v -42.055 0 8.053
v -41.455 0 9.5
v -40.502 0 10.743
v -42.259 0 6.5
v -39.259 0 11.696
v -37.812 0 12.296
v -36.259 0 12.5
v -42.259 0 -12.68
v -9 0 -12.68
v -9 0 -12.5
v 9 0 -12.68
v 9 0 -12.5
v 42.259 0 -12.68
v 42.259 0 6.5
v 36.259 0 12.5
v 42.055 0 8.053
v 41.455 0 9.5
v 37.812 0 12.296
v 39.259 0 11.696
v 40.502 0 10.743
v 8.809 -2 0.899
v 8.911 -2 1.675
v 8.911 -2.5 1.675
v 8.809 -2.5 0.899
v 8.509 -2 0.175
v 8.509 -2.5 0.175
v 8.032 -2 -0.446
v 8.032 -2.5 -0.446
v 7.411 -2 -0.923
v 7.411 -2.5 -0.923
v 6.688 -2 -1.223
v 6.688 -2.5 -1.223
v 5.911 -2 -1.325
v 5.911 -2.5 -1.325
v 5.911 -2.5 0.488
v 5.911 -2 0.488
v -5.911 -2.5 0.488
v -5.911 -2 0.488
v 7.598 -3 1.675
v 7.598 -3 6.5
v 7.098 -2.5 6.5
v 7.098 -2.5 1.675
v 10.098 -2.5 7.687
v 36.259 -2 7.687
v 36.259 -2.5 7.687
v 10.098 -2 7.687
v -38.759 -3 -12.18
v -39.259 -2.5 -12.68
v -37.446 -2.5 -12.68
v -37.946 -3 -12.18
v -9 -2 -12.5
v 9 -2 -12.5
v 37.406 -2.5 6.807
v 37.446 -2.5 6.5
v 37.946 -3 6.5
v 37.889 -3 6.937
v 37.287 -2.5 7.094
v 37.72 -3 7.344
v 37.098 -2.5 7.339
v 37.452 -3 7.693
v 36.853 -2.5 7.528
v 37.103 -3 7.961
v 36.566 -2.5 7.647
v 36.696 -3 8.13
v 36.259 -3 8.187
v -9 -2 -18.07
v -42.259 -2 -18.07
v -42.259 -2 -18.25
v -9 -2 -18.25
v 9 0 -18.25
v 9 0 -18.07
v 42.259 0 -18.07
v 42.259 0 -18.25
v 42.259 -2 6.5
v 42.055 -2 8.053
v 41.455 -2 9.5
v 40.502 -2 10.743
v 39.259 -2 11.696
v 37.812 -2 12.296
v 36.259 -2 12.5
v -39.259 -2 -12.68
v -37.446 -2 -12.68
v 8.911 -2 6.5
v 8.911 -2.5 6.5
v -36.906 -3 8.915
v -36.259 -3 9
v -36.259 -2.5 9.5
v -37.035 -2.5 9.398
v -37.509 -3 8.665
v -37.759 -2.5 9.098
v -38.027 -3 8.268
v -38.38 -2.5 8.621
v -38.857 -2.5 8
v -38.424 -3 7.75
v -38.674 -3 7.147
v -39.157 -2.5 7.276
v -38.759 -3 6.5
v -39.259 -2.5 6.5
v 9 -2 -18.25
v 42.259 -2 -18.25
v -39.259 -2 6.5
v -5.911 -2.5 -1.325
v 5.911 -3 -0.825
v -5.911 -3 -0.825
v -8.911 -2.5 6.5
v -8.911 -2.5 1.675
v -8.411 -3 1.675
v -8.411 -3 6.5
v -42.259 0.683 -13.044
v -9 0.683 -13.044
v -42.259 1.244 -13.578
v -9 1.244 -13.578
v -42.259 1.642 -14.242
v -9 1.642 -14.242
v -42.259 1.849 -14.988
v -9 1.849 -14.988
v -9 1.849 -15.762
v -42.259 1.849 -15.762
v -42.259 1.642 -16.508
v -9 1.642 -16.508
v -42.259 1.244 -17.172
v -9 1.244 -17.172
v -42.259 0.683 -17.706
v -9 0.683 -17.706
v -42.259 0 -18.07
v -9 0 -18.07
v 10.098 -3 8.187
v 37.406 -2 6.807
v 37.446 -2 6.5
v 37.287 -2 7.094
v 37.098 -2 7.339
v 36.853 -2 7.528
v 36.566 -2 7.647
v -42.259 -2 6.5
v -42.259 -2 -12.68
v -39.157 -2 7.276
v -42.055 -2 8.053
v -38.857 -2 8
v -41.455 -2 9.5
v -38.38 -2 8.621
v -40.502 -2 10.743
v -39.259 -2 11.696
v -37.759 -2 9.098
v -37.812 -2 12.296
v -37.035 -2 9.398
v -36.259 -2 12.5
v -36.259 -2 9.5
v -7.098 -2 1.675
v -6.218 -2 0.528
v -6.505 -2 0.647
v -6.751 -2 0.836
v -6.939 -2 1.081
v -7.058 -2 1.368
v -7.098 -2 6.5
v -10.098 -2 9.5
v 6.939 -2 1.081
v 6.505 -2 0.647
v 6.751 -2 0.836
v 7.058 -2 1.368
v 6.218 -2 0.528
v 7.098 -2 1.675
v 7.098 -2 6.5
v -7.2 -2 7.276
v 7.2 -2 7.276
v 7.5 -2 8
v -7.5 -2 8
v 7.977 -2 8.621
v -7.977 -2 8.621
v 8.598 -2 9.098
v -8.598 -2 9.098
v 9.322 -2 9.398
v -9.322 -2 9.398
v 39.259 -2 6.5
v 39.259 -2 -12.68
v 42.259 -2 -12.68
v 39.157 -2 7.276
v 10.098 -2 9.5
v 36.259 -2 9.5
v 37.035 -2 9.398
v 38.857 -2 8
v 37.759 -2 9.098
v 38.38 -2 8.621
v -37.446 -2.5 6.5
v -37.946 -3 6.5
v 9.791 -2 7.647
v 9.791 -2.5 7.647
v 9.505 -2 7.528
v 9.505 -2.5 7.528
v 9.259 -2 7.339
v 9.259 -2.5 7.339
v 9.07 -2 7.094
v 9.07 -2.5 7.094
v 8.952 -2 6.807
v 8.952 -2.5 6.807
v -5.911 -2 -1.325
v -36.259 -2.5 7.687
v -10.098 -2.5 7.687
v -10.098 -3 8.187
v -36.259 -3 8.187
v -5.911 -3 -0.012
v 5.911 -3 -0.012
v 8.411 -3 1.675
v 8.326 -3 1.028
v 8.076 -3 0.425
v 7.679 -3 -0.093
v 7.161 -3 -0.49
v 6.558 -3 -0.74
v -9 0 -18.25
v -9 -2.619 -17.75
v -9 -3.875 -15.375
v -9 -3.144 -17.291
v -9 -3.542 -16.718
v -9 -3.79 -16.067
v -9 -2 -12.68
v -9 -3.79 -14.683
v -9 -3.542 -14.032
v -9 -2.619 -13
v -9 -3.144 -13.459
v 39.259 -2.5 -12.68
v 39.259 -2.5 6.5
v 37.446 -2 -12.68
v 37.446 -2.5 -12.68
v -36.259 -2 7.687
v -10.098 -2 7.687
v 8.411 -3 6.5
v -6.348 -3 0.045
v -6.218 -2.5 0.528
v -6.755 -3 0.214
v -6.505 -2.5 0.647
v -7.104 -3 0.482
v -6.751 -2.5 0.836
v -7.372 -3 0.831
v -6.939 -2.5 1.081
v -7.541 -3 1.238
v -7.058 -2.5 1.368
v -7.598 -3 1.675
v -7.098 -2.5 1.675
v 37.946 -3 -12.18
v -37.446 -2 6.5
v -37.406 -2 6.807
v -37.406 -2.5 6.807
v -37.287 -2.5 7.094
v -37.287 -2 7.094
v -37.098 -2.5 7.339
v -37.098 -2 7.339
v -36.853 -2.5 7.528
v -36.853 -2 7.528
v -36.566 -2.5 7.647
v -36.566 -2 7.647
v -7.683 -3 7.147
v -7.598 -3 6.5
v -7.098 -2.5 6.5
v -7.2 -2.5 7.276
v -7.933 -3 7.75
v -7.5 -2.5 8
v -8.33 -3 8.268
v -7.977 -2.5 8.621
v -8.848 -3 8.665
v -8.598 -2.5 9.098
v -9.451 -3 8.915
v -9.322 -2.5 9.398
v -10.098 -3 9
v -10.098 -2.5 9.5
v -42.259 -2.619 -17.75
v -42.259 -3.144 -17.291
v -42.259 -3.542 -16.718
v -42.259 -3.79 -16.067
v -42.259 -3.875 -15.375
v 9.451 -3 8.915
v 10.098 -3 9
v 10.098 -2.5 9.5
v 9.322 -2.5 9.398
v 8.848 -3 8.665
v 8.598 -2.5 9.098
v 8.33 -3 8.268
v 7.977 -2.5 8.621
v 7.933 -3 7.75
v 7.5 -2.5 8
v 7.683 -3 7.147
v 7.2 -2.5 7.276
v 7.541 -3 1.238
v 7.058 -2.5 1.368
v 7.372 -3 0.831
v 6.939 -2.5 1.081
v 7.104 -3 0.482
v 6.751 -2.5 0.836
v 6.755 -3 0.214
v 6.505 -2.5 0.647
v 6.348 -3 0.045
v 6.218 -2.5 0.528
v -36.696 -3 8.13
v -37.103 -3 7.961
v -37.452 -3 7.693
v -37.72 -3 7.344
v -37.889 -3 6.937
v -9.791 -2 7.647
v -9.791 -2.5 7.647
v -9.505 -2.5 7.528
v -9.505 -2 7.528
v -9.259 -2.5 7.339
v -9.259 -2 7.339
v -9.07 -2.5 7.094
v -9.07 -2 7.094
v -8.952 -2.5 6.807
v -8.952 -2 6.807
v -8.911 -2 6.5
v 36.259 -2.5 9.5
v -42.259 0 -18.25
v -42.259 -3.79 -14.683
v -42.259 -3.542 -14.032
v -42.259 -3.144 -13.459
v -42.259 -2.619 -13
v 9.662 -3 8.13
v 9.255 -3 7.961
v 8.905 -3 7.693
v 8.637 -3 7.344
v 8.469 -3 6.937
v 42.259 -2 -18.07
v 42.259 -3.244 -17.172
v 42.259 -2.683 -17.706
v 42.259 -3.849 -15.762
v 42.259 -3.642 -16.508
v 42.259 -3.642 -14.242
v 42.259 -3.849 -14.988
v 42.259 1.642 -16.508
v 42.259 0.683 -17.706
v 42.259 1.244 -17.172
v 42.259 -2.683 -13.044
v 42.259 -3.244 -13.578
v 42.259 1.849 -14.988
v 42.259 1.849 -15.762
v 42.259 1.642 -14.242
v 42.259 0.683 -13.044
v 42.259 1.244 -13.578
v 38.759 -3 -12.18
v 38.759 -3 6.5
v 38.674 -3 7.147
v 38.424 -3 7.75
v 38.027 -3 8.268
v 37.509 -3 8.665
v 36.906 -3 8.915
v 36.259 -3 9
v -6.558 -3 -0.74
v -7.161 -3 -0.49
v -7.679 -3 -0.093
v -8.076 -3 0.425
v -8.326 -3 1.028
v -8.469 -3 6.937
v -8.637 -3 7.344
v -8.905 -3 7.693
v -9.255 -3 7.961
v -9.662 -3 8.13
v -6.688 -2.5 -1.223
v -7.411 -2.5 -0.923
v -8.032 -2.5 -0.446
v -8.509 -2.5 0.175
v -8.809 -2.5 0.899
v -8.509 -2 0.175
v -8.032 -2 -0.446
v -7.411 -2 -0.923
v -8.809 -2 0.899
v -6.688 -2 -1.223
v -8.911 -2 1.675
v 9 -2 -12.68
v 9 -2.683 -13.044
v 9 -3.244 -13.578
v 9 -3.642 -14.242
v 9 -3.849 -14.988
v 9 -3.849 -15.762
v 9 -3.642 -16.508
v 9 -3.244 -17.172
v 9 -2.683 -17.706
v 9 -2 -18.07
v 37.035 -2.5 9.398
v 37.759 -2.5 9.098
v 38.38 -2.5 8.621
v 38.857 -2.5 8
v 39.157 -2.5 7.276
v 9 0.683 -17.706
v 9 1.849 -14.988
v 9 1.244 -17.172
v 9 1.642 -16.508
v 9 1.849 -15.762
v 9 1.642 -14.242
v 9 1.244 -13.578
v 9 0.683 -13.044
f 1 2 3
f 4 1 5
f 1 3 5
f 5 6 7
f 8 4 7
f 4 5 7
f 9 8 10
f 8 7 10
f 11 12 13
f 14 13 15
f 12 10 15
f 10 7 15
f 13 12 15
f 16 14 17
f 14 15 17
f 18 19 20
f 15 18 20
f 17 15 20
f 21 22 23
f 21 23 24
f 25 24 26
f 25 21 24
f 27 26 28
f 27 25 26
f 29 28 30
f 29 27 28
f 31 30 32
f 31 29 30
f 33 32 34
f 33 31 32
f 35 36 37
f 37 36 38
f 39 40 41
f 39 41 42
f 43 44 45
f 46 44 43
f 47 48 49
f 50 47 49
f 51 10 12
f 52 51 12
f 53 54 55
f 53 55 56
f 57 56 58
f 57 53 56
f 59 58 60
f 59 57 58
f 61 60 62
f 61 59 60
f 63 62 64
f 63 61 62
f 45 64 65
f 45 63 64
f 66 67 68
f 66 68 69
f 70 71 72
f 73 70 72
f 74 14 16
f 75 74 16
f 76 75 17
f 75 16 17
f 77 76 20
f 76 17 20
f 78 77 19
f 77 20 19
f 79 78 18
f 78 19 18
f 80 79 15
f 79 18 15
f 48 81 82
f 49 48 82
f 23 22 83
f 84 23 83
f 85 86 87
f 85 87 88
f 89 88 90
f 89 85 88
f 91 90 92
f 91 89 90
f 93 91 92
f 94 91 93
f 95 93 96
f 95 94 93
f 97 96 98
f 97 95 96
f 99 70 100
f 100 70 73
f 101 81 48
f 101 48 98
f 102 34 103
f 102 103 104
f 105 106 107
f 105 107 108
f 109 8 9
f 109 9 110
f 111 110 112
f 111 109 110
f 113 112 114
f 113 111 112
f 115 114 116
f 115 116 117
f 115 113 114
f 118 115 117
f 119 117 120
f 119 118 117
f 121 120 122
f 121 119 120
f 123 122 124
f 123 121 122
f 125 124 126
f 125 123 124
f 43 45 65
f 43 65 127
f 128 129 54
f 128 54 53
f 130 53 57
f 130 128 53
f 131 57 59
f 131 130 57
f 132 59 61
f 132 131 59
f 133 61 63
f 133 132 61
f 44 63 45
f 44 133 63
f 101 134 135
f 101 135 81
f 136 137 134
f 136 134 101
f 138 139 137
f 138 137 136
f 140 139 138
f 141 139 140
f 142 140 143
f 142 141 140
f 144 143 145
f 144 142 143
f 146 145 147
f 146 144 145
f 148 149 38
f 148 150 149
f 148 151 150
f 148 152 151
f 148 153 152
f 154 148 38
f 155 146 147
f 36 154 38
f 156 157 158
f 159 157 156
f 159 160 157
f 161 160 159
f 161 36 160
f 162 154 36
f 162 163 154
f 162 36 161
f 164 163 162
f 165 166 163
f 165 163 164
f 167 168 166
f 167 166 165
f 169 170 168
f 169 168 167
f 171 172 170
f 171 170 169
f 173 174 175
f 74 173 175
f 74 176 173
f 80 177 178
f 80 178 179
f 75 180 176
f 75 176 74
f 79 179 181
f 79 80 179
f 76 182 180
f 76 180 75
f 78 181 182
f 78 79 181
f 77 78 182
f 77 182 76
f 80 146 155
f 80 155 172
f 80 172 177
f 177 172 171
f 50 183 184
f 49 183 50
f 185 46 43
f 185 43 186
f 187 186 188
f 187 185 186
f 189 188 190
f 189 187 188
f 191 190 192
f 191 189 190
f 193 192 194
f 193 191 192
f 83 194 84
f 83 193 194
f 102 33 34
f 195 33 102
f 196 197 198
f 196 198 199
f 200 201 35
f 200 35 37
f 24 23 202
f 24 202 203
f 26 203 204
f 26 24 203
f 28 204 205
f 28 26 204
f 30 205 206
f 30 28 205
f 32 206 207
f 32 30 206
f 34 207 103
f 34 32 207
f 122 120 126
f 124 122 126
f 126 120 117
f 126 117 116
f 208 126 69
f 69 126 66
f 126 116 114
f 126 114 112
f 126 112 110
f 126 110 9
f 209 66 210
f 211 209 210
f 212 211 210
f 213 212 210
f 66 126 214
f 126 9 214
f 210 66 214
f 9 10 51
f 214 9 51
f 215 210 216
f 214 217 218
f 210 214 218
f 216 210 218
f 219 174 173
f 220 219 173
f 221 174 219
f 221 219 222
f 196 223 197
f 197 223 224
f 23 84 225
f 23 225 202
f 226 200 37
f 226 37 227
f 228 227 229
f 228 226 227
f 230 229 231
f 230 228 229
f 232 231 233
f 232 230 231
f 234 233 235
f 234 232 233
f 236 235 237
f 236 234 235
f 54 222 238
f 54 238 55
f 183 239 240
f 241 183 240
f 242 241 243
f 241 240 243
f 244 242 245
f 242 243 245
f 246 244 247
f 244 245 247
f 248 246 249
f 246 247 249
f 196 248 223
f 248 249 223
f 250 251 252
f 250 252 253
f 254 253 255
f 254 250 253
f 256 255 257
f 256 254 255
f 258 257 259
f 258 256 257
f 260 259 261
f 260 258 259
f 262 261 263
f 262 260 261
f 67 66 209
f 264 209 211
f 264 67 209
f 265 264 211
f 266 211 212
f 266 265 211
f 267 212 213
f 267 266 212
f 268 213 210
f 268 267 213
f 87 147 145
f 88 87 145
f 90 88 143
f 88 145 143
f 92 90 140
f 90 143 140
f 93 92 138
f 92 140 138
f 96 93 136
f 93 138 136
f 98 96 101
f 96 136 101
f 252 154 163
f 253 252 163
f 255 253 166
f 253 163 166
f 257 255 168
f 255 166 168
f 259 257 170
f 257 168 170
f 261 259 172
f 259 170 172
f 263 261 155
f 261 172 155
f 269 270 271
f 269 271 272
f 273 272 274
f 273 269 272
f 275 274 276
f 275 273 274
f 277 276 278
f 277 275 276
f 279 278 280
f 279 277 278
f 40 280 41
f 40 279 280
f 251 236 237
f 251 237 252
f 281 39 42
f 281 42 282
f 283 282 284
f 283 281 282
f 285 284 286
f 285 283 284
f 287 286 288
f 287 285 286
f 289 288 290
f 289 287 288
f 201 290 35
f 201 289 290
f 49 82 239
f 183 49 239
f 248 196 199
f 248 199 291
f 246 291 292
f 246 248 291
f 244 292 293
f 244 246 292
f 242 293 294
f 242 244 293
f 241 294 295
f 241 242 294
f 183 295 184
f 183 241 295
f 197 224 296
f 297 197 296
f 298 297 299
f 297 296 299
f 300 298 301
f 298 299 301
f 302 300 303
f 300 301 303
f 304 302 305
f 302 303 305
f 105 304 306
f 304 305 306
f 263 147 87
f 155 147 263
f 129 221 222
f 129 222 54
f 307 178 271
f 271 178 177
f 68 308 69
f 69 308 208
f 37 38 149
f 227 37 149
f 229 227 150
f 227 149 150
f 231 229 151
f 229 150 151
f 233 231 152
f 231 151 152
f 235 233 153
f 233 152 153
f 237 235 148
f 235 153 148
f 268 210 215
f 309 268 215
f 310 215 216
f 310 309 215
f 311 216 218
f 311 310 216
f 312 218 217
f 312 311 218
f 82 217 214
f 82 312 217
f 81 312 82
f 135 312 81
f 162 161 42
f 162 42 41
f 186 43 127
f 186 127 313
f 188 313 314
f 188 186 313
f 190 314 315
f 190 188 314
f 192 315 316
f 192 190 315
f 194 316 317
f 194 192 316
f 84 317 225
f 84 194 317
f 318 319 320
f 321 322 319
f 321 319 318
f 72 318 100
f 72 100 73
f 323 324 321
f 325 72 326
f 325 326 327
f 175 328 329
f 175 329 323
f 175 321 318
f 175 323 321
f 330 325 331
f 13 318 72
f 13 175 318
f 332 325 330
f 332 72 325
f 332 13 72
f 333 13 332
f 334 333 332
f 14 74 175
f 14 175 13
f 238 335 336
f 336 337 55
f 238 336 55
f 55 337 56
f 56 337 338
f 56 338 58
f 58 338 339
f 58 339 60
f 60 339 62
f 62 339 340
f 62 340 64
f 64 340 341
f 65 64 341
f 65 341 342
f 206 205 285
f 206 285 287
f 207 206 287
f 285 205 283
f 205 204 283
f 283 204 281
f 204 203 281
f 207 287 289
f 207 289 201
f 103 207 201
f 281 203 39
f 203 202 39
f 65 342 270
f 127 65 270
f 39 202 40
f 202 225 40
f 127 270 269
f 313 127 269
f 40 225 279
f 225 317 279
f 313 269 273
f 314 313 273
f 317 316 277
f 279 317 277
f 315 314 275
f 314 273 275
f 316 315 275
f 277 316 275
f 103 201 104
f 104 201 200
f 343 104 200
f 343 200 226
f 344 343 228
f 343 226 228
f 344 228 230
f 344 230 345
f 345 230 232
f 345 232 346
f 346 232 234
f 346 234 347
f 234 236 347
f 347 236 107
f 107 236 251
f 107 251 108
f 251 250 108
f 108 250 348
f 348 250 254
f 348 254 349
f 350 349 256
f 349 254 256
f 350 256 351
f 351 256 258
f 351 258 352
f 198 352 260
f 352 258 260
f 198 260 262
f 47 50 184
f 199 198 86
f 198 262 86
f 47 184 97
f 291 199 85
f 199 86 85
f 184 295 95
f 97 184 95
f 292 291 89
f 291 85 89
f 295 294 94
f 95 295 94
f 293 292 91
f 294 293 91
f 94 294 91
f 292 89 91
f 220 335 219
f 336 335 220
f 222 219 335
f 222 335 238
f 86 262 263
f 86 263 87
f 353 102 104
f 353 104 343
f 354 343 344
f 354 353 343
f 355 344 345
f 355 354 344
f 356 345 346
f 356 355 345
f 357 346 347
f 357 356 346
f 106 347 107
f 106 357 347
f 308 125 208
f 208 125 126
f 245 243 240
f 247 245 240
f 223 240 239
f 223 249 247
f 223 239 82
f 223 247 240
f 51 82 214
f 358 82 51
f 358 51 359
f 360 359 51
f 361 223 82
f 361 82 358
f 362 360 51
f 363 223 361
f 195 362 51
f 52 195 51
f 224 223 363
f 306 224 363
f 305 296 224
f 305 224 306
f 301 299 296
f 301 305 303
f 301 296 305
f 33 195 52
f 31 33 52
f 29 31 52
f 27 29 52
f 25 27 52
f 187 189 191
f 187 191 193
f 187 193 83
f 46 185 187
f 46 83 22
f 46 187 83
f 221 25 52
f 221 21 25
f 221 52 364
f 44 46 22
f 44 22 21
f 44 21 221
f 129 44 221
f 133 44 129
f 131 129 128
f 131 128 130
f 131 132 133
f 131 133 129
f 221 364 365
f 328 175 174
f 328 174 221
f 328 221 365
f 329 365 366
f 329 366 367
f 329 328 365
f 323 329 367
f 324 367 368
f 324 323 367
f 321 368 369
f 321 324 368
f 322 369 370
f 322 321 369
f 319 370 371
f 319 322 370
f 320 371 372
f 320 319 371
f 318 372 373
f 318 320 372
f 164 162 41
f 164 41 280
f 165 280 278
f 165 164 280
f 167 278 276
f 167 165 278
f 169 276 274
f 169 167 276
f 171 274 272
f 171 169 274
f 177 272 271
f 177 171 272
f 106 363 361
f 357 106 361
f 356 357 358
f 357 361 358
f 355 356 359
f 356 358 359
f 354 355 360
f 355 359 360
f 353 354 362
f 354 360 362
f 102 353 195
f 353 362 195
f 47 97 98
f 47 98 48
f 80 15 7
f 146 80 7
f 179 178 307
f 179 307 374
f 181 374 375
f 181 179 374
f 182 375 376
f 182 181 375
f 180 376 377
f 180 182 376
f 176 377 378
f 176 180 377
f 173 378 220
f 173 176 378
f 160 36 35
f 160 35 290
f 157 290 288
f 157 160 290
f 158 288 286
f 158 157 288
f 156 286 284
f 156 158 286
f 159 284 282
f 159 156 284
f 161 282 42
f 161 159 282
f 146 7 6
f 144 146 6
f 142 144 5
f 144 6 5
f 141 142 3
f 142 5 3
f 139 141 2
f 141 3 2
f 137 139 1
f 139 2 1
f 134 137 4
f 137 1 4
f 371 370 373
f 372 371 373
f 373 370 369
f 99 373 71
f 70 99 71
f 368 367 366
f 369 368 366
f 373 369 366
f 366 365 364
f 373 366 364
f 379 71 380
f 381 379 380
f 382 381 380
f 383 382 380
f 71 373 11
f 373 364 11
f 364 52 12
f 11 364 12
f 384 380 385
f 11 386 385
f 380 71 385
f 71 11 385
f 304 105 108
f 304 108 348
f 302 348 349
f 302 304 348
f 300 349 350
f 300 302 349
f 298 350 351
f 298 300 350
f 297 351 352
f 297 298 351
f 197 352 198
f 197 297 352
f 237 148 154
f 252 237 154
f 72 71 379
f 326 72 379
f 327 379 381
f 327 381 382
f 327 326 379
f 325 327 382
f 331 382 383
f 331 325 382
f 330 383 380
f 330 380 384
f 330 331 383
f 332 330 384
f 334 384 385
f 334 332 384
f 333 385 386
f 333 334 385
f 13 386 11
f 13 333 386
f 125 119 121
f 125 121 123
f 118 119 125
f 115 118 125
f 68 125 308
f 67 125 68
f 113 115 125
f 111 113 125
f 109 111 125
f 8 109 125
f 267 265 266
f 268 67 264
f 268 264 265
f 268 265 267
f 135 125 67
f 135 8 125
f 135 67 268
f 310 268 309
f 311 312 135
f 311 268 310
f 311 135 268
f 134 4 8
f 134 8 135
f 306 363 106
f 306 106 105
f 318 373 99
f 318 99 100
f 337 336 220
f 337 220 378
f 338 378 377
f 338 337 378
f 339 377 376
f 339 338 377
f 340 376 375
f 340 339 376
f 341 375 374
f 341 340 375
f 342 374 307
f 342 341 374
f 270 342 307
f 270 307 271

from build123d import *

# Parameters (mm, degrees)
F0_W     = 33.259
F0_H     = 5.75
F1_DEPTH = 2
F3_DEPTH = 33.259
F6_DEPTH = 33.259
F4_W     = 1.8128321722
F4_H     = 19.1795176684
F4_W_2   = 26.160747505
F4_H_2   = 1.8128321722
F4_H_3   = 4.8250346239
F4_W_3   = 5.911082495
F4_H_4   = 1.81283
F7_DEPTH = 1
F8_SIZE  = 0.5


# Not quite as in the source:
# - ends of sketch curves that miss each other by under 0.0002 mm in the source are joined
# - a pattern or mirror of a feature is missing from the dataset's text; its kind, count and spacing are read off the source's solid


with BuildPart() as f1:
    # F0 (on Front) → F1 (new body)
    with BuildSketch(Plane.XZ):
        with BuildLine():
            Line((36.259, 12.5), (-36.259, 12.5))
            ThreePointArc((-36.259, 12.5), (-40.5016406871, 10.7426406871), (-42.259, 6.5))
            Line((-42.259, 6.5), (-42.259, -12.5))
            Line((-42.259, -12.5), (-9, -12.5))
            Line((-9, -12.5), (-3.6677482234, -11.0712274426))
            Line((-3.6677482234, -11.0712274426), (3.6677482234, -11.0712274426))
            Line((3.6677482234, -11.0712274426), (9, -12.5))
            Line((9, -12.5), (42.259, -12.5))
            Line((42.259, -12.5), (42.259, 6.5))
            ThreePointArc((42.259, 6.5), (40.5016406871, 10.7426406871), (36.259, 12.5))
        make_face()
        with Locations((-25.6295, -15.375)):
            Rectangle(F0_W, F0_H)
        with Locations((25.6295, -15.375)):
            Rectangle(F0_W, F0_H)
        Polygon((-3.6677482234, -11.0712274426), (-9, -12.5), (9, -12.5), (3.6677482234, -11.0712274426), align=None)
    extrude(amount=F1_DEPTH)

    # F2 (on face) → F3 (join, through all)
    with BuildSketch(Plane(origin=(-42.259, 0, 0), x_dir=(0, -1, 0), z_dir=(-1, 0, 0))):
        with BuildLine():
            ThreePointArc((3.875, -15.375), (3.3601509486, -13.7332593079), (2, -12.6795176684))
            Line((2, -12.6795176684), (2, -18.0704823316))
            ThreePointArc((2, -18.0704823316), (3.3601509486, -17.0167406921), (3.875, -15.375))
        make_face()
        with BuildLine():
            Line((2, -18.0704823316), (2, -12.6795176684))
            ThreePointArc((2, -12.6795176684), (-1.875, -15.375), (2, -18.0704823316))
        make_face()
    extrude(amount=-F3_DEPTH)

    # F5 (on face) → F6 (join, through all)
    with BuildSketch(Plane.YZ.offset(42.259)):
        with BuildLine():
            ThreePointArc((0, -18.0704823316), (1.875, -15.375), (0, -12.6795176684))
            Line((0, -12.6795176684), (0, -12.5))
            Line((0, -12.5), (-2, -12.5))
            Line((-2, -12.5), (-2, -12.6795176684))
            ThreePointArc((-2, -12.6795176684), (-3.875, -15.375), (-2, -18.0704823316))
            Line((-2, -18.0704823316), (-2, -18.25))
            Line((-2, -18.25), (0, -18.25))
            Line((0, -18.25), (0, -18.0704823316))
        make_face()
    extrude(amount=-F6_DEPTH)

    # F4 (on face) → F7 (join)
    with BuildSketch(Plane.XZ.offset(2)):
        with Locations((-38.3525839139, -3.0897588342)):
            Rectangle(F4_W, F4_H)
        with BuildLine():
            ThreePointArc((-36.259, 9.5), (-38.3803203436, 8.6213203436), (-39.259, 6.5))
            Line((-39.259, 6.5), (-37.4461678278, 6.5))
            ThreePointArc((-37.4461678278, 6.5), (-37.0984544214, 7.3394544214), (-36.259, 7.6871678278))
            Line((-36.259, 7.6871678278), (-36.259, 9.5))
        make_face()
        with Locations((-23.1786262475, 8.5935839139)):
            Rectangle(F4_W_2, F4_H_2)
        with BuildLine():
            ThreePointArc((-7.098252495, 6.5), (-7.9769321514, 8.6213203436), (-10.098252495, 9.5))
            Line((-10.098252495, 9.5), (-10.098252495, 7.6871678278))
            ThreePointArc((-10.098252495, 7.6871678278), (-9.2587980736, 7.3394544214), (-8.9110846672, 6.5))
            Line((-8.9110846672, 6.5), (-7.098252495, 6.5))
        make_face()
        with Locations((-8.0046685811, 4.087482688)):
            Rectangle(F4_W, F4_H_3)
        with Locations((-2.9555412475, -0.4186196239)):
            Rectangle(F4_W_3, F4_H_4)
        with BuildLine():
            ThreePointArc((-5.911082495, 0.4877953761), (-6.7505384524, 0.8355094187), (-7.098252495, 1.6749653761))
            Line((-7.098252495, 1.6749653761), (-8.9110846672, 1.6749653761))
            ThreePointArc((-8.9110846672, 1.6749653761), (-8.0324028386, -0.4463549675), (-5.911082495, -1.3250346239))
            Line((-5.911082495, -1.3250346239), (-5.911082495, 0.4877953761))
        make_face()
    f7 = extrude(amount=F7_DEPTH)

    # F7_copies: F7 across plane
    add(f7.mirror(Plane(origin=(0, 0, 0), x_dir=(0, 0, 1), z_dir=(1, 0, 0))))

    # F8
    f8_edges = [f1.edges().sort_by_distance(p)[0] for p in [
        (39.259, -3, -3.089759),
        (38.352584, -3, -12.679518),
        (37.446168, -3, -3.089759),
        (37.098454, -3, 7.339454),
        (23.178626, -3, 7.687168),
        (9.258798, -3, 7.339454),
        (8.911085, -3, 4.087483),
        (8.032403, -3, -0.446355),
        (0, -3, -1.325035),
        (-8.032403, -3, -0.446355),
        (-8.911085, -3, 4.087483),
        (-9.258798, -3, 7.339454),
        (-23.178626, -3, 7.687168),
        (-37.098454, -3, 7.339454),
        (-37.446168, -3, -3.089759),
        (-38.352584, -3, -12.679518),
        (-39.259, -3, -3.089759),
        (-38.38032, -3, 8.62132),
        (-23.178626, -3, 9.5),
        (-7.976932, -3, 8.62132),
        (-7.098252, -3, 4.087483),
        (-6.750538, -3, 0.835509),
        (0, -3, 0.487795),
        (6.750538, -3, 0.835509),
        (7.098252, -3, 4.087483),
        (7.976932, -3, 8.62132),
        (23.178626, -3, 9.5),
        (38.38032, -3, 8.62132),
    ]]
    chamfer(f8_edges, length=F8_SIZE)


solid = f1.part
